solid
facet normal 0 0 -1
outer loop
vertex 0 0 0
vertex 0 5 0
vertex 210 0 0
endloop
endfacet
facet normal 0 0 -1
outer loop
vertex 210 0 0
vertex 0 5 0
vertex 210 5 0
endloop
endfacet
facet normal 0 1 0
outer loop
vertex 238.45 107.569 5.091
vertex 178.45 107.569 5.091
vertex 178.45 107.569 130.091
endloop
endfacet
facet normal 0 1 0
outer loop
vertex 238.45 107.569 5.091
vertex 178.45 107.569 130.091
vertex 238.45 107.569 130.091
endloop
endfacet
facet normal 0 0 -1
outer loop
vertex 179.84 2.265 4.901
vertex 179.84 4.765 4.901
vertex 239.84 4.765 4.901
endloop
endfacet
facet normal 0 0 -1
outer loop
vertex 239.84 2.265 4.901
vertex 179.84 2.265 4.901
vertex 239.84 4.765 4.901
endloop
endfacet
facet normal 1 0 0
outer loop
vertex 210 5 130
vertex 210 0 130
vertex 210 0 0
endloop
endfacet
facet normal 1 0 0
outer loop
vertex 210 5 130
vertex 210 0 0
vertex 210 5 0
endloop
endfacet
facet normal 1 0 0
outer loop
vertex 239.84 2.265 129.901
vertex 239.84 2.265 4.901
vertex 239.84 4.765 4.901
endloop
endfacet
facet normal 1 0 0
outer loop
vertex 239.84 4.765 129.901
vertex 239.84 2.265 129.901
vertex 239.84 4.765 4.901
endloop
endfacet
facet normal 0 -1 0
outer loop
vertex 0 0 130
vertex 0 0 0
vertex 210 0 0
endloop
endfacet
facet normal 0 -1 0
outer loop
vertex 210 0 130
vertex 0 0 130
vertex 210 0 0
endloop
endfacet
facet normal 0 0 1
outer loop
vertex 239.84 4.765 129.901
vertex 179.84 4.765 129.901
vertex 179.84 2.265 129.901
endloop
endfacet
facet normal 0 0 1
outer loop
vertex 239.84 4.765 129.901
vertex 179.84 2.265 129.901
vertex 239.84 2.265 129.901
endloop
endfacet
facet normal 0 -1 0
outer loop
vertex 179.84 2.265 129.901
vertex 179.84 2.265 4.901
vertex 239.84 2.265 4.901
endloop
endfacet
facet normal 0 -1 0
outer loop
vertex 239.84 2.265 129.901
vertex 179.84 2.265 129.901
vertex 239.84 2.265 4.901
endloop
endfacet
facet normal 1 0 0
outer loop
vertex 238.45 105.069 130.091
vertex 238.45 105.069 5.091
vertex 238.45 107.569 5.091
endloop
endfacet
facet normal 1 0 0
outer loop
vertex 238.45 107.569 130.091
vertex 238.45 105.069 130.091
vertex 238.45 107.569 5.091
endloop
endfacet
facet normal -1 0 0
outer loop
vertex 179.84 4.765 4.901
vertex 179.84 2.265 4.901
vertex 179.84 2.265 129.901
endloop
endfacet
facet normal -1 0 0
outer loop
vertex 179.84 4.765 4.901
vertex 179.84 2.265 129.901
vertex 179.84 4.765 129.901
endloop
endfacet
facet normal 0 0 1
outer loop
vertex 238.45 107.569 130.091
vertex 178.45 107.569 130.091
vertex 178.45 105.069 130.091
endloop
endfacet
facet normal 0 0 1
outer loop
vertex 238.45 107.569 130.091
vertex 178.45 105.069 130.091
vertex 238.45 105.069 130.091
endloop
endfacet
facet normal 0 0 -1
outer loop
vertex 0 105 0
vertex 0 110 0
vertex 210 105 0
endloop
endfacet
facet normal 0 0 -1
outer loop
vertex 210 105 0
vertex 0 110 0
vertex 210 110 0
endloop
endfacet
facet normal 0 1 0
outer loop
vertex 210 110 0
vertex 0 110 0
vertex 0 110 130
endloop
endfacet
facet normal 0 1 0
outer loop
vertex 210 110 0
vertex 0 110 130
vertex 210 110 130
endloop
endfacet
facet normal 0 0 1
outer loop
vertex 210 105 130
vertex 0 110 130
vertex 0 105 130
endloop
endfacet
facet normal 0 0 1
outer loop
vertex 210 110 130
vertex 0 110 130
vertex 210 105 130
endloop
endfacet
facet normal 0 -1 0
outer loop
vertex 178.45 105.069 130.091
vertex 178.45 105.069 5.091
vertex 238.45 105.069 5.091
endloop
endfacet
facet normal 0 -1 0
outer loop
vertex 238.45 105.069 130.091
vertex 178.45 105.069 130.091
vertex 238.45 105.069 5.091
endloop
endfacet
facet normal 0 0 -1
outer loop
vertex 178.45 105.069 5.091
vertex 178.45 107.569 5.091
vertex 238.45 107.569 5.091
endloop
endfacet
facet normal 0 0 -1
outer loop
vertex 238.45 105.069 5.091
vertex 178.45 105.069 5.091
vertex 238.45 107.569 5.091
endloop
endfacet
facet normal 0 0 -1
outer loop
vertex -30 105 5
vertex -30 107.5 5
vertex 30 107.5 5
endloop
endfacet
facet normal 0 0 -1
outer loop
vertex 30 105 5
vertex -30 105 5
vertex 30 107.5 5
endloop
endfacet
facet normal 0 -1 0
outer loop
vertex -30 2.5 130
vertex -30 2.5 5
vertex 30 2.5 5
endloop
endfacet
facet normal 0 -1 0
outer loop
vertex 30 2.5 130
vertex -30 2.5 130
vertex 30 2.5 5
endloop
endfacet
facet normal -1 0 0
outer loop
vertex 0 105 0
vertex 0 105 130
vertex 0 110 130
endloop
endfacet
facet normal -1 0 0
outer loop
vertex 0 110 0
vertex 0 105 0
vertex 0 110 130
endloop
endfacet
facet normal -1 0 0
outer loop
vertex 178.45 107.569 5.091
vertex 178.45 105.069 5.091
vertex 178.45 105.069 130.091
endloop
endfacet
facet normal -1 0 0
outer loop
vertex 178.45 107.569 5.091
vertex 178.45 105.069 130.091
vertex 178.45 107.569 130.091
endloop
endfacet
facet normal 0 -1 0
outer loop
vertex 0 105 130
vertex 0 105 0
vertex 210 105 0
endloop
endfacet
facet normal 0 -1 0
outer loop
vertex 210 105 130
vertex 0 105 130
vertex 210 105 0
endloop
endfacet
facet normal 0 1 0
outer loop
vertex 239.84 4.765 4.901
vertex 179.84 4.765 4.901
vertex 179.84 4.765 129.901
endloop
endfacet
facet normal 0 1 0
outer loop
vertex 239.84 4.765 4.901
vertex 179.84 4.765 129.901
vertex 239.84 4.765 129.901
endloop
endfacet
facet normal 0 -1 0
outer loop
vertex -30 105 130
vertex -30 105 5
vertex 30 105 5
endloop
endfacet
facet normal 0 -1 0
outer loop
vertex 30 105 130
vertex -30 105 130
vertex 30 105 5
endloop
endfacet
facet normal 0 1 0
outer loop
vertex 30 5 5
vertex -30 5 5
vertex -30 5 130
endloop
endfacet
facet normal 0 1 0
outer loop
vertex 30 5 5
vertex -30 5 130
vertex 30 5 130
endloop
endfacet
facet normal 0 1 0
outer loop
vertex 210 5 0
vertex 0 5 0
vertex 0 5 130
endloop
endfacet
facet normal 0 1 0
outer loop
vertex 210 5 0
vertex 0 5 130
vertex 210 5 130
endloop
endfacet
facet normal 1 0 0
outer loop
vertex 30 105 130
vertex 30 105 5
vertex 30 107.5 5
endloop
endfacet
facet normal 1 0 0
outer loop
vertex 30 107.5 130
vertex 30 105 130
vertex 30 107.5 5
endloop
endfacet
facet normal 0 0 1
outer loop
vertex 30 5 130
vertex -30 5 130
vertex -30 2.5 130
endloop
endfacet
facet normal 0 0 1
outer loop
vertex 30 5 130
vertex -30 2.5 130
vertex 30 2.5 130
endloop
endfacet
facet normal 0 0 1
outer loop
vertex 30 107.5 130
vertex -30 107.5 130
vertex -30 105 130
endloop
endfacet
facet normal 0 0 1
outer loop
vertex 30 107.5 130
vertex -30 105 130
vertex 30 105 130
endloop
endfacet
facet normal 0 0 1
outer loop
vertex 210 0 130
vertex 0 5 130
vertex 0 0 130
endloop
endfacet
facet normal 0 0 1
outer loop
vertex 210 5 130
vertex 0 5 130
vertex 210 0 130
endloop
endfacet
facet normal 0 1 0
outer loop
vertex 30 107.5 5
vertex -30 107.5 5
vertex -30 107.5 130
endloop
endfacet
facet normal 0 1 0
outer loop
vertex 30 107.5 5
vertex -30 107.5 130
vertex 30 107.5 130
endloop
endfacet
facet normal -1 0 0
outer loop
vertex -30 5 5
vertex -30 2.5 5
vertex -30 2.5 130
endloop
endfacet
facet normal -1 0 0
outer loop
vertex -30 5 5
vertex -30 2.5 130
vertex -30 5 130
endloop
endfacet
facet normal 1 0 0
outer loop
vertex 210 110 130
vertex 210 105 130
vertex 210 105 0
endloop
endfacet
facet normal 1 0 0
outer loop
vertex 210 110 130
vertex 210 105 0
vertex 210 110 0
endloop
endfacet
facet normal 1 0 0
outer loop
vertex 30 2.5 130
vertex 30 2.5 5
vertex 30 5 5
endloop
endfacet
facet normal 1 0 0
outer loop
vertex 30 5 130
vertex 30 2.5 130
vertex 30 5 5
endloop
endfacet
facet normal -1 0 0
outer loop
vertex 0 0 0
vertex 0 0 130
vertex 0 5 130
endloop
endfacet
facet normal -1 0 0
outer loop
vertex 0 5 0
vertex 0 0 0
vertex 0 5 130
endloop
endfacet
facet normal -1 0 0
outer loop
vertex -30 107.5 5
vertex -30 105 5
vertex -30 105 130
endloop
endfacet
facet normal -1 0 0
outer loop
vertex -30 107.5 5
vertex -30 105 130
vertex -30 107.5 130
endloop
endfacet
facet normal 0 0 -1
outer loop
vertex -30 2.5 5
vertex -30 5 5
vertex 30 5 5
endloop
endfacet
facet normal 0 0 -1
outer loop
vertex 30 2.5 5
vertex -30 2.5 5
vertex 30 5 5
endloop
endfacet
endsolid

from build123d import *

# Parameters (mm, degrees)
BOX009_W     = 60
BOX009_H     = 2.5
BOX009_DEPTH = 125
BOX002_W     = 210
BOX002_H     = 5
BOX002_DEPTH = 130
BOX003_W     = 210
BOX003_H     = 5
BOX003_DEPTH = 130
BOX011_W     = 60
BOX011_H     = 2.5
BOX011_DEPTH = 125
BOX012_W     = 60
BOX012_H     = 2.5
BOX012_DEPTH = 125
BOX013_W     = 60
BOX013_H     = 2.5
BOX013_DEPTH = 125


with BuildPart() as cube009:
    # Box009 → Box009 (new body)
    with BuildSketch(Plane(origin=(-30, 2.5, 5), x_dir=(1, 0, 0), z_dir=(0, 0, 1))):
        with Locations((30, 1.25)):
            Rectangle(BOX009_W, BOX009_H)
    extrude(amount=BOX009_DEPTH)


with BuildPart() as cube002:
    # Box002 → Box002 (new body)
    with BuildSketch(Plane(origin=(0, 105, 0), x_dir=(1, 0, 0), z_dir=(0, 0, 1))):
        with Locations((105, 2.5)):
            Rectangle(BOX002_W, BOX002_H)
    extrude(amount=BOX002_DEPTH)


with BuildPart() as cube003:
    # Box003 → Box003 (new body)
    with BuildSketch(Plane.XY):
        with Locations((105, 2.5)):
            Rectangle(BOX003_W, BOX003_H)
    extrude(amount=BOX003_DEPTH)


with BuildPart() as cube011:
    # Box011 → Box011 (new body)
    with BuildSketch(Plane(origin=(178.449559, 105.068698, 5.091172), x_dir=(1, 0, 0), z_dir=(0, 0, 1))):
        with Locations((30, 1.25)):
            Rectangle(BOX011_W, BOX011_H)
    extrude(amount=BOX011_DEPTH)


with BuildPart() as cube012:
    # Box012 → Box012 (new body)
    with BuildSketch(Plane(origin=(-30, 105, 5), x_dir=(1, 0, 0), z_dir=(0, 0, 1))):
        with Locations((30, 1.25)):
            Rectangle(BOX012_W, BOX012_H)
    extrude(amount=BOX012_DEPTH)


with BuildPart() as cube013:
    # Box013 → Box013 (new body)
    with BuildSketch(Plane(origin=(179.839662, 2.264511, 4.901054), x_dir=(1, 0, 0), z_dir=(0, 0, 1))):
        with Locations((30, 1.25)):
            Rectangle(BOX013_W, BOX013_H)
    extrude(amount=BOX013_DEPTH)


solid = Compound([cube009.part, cube002.part, cube003.part, cube011.part, cube012.part, cube013.part])
